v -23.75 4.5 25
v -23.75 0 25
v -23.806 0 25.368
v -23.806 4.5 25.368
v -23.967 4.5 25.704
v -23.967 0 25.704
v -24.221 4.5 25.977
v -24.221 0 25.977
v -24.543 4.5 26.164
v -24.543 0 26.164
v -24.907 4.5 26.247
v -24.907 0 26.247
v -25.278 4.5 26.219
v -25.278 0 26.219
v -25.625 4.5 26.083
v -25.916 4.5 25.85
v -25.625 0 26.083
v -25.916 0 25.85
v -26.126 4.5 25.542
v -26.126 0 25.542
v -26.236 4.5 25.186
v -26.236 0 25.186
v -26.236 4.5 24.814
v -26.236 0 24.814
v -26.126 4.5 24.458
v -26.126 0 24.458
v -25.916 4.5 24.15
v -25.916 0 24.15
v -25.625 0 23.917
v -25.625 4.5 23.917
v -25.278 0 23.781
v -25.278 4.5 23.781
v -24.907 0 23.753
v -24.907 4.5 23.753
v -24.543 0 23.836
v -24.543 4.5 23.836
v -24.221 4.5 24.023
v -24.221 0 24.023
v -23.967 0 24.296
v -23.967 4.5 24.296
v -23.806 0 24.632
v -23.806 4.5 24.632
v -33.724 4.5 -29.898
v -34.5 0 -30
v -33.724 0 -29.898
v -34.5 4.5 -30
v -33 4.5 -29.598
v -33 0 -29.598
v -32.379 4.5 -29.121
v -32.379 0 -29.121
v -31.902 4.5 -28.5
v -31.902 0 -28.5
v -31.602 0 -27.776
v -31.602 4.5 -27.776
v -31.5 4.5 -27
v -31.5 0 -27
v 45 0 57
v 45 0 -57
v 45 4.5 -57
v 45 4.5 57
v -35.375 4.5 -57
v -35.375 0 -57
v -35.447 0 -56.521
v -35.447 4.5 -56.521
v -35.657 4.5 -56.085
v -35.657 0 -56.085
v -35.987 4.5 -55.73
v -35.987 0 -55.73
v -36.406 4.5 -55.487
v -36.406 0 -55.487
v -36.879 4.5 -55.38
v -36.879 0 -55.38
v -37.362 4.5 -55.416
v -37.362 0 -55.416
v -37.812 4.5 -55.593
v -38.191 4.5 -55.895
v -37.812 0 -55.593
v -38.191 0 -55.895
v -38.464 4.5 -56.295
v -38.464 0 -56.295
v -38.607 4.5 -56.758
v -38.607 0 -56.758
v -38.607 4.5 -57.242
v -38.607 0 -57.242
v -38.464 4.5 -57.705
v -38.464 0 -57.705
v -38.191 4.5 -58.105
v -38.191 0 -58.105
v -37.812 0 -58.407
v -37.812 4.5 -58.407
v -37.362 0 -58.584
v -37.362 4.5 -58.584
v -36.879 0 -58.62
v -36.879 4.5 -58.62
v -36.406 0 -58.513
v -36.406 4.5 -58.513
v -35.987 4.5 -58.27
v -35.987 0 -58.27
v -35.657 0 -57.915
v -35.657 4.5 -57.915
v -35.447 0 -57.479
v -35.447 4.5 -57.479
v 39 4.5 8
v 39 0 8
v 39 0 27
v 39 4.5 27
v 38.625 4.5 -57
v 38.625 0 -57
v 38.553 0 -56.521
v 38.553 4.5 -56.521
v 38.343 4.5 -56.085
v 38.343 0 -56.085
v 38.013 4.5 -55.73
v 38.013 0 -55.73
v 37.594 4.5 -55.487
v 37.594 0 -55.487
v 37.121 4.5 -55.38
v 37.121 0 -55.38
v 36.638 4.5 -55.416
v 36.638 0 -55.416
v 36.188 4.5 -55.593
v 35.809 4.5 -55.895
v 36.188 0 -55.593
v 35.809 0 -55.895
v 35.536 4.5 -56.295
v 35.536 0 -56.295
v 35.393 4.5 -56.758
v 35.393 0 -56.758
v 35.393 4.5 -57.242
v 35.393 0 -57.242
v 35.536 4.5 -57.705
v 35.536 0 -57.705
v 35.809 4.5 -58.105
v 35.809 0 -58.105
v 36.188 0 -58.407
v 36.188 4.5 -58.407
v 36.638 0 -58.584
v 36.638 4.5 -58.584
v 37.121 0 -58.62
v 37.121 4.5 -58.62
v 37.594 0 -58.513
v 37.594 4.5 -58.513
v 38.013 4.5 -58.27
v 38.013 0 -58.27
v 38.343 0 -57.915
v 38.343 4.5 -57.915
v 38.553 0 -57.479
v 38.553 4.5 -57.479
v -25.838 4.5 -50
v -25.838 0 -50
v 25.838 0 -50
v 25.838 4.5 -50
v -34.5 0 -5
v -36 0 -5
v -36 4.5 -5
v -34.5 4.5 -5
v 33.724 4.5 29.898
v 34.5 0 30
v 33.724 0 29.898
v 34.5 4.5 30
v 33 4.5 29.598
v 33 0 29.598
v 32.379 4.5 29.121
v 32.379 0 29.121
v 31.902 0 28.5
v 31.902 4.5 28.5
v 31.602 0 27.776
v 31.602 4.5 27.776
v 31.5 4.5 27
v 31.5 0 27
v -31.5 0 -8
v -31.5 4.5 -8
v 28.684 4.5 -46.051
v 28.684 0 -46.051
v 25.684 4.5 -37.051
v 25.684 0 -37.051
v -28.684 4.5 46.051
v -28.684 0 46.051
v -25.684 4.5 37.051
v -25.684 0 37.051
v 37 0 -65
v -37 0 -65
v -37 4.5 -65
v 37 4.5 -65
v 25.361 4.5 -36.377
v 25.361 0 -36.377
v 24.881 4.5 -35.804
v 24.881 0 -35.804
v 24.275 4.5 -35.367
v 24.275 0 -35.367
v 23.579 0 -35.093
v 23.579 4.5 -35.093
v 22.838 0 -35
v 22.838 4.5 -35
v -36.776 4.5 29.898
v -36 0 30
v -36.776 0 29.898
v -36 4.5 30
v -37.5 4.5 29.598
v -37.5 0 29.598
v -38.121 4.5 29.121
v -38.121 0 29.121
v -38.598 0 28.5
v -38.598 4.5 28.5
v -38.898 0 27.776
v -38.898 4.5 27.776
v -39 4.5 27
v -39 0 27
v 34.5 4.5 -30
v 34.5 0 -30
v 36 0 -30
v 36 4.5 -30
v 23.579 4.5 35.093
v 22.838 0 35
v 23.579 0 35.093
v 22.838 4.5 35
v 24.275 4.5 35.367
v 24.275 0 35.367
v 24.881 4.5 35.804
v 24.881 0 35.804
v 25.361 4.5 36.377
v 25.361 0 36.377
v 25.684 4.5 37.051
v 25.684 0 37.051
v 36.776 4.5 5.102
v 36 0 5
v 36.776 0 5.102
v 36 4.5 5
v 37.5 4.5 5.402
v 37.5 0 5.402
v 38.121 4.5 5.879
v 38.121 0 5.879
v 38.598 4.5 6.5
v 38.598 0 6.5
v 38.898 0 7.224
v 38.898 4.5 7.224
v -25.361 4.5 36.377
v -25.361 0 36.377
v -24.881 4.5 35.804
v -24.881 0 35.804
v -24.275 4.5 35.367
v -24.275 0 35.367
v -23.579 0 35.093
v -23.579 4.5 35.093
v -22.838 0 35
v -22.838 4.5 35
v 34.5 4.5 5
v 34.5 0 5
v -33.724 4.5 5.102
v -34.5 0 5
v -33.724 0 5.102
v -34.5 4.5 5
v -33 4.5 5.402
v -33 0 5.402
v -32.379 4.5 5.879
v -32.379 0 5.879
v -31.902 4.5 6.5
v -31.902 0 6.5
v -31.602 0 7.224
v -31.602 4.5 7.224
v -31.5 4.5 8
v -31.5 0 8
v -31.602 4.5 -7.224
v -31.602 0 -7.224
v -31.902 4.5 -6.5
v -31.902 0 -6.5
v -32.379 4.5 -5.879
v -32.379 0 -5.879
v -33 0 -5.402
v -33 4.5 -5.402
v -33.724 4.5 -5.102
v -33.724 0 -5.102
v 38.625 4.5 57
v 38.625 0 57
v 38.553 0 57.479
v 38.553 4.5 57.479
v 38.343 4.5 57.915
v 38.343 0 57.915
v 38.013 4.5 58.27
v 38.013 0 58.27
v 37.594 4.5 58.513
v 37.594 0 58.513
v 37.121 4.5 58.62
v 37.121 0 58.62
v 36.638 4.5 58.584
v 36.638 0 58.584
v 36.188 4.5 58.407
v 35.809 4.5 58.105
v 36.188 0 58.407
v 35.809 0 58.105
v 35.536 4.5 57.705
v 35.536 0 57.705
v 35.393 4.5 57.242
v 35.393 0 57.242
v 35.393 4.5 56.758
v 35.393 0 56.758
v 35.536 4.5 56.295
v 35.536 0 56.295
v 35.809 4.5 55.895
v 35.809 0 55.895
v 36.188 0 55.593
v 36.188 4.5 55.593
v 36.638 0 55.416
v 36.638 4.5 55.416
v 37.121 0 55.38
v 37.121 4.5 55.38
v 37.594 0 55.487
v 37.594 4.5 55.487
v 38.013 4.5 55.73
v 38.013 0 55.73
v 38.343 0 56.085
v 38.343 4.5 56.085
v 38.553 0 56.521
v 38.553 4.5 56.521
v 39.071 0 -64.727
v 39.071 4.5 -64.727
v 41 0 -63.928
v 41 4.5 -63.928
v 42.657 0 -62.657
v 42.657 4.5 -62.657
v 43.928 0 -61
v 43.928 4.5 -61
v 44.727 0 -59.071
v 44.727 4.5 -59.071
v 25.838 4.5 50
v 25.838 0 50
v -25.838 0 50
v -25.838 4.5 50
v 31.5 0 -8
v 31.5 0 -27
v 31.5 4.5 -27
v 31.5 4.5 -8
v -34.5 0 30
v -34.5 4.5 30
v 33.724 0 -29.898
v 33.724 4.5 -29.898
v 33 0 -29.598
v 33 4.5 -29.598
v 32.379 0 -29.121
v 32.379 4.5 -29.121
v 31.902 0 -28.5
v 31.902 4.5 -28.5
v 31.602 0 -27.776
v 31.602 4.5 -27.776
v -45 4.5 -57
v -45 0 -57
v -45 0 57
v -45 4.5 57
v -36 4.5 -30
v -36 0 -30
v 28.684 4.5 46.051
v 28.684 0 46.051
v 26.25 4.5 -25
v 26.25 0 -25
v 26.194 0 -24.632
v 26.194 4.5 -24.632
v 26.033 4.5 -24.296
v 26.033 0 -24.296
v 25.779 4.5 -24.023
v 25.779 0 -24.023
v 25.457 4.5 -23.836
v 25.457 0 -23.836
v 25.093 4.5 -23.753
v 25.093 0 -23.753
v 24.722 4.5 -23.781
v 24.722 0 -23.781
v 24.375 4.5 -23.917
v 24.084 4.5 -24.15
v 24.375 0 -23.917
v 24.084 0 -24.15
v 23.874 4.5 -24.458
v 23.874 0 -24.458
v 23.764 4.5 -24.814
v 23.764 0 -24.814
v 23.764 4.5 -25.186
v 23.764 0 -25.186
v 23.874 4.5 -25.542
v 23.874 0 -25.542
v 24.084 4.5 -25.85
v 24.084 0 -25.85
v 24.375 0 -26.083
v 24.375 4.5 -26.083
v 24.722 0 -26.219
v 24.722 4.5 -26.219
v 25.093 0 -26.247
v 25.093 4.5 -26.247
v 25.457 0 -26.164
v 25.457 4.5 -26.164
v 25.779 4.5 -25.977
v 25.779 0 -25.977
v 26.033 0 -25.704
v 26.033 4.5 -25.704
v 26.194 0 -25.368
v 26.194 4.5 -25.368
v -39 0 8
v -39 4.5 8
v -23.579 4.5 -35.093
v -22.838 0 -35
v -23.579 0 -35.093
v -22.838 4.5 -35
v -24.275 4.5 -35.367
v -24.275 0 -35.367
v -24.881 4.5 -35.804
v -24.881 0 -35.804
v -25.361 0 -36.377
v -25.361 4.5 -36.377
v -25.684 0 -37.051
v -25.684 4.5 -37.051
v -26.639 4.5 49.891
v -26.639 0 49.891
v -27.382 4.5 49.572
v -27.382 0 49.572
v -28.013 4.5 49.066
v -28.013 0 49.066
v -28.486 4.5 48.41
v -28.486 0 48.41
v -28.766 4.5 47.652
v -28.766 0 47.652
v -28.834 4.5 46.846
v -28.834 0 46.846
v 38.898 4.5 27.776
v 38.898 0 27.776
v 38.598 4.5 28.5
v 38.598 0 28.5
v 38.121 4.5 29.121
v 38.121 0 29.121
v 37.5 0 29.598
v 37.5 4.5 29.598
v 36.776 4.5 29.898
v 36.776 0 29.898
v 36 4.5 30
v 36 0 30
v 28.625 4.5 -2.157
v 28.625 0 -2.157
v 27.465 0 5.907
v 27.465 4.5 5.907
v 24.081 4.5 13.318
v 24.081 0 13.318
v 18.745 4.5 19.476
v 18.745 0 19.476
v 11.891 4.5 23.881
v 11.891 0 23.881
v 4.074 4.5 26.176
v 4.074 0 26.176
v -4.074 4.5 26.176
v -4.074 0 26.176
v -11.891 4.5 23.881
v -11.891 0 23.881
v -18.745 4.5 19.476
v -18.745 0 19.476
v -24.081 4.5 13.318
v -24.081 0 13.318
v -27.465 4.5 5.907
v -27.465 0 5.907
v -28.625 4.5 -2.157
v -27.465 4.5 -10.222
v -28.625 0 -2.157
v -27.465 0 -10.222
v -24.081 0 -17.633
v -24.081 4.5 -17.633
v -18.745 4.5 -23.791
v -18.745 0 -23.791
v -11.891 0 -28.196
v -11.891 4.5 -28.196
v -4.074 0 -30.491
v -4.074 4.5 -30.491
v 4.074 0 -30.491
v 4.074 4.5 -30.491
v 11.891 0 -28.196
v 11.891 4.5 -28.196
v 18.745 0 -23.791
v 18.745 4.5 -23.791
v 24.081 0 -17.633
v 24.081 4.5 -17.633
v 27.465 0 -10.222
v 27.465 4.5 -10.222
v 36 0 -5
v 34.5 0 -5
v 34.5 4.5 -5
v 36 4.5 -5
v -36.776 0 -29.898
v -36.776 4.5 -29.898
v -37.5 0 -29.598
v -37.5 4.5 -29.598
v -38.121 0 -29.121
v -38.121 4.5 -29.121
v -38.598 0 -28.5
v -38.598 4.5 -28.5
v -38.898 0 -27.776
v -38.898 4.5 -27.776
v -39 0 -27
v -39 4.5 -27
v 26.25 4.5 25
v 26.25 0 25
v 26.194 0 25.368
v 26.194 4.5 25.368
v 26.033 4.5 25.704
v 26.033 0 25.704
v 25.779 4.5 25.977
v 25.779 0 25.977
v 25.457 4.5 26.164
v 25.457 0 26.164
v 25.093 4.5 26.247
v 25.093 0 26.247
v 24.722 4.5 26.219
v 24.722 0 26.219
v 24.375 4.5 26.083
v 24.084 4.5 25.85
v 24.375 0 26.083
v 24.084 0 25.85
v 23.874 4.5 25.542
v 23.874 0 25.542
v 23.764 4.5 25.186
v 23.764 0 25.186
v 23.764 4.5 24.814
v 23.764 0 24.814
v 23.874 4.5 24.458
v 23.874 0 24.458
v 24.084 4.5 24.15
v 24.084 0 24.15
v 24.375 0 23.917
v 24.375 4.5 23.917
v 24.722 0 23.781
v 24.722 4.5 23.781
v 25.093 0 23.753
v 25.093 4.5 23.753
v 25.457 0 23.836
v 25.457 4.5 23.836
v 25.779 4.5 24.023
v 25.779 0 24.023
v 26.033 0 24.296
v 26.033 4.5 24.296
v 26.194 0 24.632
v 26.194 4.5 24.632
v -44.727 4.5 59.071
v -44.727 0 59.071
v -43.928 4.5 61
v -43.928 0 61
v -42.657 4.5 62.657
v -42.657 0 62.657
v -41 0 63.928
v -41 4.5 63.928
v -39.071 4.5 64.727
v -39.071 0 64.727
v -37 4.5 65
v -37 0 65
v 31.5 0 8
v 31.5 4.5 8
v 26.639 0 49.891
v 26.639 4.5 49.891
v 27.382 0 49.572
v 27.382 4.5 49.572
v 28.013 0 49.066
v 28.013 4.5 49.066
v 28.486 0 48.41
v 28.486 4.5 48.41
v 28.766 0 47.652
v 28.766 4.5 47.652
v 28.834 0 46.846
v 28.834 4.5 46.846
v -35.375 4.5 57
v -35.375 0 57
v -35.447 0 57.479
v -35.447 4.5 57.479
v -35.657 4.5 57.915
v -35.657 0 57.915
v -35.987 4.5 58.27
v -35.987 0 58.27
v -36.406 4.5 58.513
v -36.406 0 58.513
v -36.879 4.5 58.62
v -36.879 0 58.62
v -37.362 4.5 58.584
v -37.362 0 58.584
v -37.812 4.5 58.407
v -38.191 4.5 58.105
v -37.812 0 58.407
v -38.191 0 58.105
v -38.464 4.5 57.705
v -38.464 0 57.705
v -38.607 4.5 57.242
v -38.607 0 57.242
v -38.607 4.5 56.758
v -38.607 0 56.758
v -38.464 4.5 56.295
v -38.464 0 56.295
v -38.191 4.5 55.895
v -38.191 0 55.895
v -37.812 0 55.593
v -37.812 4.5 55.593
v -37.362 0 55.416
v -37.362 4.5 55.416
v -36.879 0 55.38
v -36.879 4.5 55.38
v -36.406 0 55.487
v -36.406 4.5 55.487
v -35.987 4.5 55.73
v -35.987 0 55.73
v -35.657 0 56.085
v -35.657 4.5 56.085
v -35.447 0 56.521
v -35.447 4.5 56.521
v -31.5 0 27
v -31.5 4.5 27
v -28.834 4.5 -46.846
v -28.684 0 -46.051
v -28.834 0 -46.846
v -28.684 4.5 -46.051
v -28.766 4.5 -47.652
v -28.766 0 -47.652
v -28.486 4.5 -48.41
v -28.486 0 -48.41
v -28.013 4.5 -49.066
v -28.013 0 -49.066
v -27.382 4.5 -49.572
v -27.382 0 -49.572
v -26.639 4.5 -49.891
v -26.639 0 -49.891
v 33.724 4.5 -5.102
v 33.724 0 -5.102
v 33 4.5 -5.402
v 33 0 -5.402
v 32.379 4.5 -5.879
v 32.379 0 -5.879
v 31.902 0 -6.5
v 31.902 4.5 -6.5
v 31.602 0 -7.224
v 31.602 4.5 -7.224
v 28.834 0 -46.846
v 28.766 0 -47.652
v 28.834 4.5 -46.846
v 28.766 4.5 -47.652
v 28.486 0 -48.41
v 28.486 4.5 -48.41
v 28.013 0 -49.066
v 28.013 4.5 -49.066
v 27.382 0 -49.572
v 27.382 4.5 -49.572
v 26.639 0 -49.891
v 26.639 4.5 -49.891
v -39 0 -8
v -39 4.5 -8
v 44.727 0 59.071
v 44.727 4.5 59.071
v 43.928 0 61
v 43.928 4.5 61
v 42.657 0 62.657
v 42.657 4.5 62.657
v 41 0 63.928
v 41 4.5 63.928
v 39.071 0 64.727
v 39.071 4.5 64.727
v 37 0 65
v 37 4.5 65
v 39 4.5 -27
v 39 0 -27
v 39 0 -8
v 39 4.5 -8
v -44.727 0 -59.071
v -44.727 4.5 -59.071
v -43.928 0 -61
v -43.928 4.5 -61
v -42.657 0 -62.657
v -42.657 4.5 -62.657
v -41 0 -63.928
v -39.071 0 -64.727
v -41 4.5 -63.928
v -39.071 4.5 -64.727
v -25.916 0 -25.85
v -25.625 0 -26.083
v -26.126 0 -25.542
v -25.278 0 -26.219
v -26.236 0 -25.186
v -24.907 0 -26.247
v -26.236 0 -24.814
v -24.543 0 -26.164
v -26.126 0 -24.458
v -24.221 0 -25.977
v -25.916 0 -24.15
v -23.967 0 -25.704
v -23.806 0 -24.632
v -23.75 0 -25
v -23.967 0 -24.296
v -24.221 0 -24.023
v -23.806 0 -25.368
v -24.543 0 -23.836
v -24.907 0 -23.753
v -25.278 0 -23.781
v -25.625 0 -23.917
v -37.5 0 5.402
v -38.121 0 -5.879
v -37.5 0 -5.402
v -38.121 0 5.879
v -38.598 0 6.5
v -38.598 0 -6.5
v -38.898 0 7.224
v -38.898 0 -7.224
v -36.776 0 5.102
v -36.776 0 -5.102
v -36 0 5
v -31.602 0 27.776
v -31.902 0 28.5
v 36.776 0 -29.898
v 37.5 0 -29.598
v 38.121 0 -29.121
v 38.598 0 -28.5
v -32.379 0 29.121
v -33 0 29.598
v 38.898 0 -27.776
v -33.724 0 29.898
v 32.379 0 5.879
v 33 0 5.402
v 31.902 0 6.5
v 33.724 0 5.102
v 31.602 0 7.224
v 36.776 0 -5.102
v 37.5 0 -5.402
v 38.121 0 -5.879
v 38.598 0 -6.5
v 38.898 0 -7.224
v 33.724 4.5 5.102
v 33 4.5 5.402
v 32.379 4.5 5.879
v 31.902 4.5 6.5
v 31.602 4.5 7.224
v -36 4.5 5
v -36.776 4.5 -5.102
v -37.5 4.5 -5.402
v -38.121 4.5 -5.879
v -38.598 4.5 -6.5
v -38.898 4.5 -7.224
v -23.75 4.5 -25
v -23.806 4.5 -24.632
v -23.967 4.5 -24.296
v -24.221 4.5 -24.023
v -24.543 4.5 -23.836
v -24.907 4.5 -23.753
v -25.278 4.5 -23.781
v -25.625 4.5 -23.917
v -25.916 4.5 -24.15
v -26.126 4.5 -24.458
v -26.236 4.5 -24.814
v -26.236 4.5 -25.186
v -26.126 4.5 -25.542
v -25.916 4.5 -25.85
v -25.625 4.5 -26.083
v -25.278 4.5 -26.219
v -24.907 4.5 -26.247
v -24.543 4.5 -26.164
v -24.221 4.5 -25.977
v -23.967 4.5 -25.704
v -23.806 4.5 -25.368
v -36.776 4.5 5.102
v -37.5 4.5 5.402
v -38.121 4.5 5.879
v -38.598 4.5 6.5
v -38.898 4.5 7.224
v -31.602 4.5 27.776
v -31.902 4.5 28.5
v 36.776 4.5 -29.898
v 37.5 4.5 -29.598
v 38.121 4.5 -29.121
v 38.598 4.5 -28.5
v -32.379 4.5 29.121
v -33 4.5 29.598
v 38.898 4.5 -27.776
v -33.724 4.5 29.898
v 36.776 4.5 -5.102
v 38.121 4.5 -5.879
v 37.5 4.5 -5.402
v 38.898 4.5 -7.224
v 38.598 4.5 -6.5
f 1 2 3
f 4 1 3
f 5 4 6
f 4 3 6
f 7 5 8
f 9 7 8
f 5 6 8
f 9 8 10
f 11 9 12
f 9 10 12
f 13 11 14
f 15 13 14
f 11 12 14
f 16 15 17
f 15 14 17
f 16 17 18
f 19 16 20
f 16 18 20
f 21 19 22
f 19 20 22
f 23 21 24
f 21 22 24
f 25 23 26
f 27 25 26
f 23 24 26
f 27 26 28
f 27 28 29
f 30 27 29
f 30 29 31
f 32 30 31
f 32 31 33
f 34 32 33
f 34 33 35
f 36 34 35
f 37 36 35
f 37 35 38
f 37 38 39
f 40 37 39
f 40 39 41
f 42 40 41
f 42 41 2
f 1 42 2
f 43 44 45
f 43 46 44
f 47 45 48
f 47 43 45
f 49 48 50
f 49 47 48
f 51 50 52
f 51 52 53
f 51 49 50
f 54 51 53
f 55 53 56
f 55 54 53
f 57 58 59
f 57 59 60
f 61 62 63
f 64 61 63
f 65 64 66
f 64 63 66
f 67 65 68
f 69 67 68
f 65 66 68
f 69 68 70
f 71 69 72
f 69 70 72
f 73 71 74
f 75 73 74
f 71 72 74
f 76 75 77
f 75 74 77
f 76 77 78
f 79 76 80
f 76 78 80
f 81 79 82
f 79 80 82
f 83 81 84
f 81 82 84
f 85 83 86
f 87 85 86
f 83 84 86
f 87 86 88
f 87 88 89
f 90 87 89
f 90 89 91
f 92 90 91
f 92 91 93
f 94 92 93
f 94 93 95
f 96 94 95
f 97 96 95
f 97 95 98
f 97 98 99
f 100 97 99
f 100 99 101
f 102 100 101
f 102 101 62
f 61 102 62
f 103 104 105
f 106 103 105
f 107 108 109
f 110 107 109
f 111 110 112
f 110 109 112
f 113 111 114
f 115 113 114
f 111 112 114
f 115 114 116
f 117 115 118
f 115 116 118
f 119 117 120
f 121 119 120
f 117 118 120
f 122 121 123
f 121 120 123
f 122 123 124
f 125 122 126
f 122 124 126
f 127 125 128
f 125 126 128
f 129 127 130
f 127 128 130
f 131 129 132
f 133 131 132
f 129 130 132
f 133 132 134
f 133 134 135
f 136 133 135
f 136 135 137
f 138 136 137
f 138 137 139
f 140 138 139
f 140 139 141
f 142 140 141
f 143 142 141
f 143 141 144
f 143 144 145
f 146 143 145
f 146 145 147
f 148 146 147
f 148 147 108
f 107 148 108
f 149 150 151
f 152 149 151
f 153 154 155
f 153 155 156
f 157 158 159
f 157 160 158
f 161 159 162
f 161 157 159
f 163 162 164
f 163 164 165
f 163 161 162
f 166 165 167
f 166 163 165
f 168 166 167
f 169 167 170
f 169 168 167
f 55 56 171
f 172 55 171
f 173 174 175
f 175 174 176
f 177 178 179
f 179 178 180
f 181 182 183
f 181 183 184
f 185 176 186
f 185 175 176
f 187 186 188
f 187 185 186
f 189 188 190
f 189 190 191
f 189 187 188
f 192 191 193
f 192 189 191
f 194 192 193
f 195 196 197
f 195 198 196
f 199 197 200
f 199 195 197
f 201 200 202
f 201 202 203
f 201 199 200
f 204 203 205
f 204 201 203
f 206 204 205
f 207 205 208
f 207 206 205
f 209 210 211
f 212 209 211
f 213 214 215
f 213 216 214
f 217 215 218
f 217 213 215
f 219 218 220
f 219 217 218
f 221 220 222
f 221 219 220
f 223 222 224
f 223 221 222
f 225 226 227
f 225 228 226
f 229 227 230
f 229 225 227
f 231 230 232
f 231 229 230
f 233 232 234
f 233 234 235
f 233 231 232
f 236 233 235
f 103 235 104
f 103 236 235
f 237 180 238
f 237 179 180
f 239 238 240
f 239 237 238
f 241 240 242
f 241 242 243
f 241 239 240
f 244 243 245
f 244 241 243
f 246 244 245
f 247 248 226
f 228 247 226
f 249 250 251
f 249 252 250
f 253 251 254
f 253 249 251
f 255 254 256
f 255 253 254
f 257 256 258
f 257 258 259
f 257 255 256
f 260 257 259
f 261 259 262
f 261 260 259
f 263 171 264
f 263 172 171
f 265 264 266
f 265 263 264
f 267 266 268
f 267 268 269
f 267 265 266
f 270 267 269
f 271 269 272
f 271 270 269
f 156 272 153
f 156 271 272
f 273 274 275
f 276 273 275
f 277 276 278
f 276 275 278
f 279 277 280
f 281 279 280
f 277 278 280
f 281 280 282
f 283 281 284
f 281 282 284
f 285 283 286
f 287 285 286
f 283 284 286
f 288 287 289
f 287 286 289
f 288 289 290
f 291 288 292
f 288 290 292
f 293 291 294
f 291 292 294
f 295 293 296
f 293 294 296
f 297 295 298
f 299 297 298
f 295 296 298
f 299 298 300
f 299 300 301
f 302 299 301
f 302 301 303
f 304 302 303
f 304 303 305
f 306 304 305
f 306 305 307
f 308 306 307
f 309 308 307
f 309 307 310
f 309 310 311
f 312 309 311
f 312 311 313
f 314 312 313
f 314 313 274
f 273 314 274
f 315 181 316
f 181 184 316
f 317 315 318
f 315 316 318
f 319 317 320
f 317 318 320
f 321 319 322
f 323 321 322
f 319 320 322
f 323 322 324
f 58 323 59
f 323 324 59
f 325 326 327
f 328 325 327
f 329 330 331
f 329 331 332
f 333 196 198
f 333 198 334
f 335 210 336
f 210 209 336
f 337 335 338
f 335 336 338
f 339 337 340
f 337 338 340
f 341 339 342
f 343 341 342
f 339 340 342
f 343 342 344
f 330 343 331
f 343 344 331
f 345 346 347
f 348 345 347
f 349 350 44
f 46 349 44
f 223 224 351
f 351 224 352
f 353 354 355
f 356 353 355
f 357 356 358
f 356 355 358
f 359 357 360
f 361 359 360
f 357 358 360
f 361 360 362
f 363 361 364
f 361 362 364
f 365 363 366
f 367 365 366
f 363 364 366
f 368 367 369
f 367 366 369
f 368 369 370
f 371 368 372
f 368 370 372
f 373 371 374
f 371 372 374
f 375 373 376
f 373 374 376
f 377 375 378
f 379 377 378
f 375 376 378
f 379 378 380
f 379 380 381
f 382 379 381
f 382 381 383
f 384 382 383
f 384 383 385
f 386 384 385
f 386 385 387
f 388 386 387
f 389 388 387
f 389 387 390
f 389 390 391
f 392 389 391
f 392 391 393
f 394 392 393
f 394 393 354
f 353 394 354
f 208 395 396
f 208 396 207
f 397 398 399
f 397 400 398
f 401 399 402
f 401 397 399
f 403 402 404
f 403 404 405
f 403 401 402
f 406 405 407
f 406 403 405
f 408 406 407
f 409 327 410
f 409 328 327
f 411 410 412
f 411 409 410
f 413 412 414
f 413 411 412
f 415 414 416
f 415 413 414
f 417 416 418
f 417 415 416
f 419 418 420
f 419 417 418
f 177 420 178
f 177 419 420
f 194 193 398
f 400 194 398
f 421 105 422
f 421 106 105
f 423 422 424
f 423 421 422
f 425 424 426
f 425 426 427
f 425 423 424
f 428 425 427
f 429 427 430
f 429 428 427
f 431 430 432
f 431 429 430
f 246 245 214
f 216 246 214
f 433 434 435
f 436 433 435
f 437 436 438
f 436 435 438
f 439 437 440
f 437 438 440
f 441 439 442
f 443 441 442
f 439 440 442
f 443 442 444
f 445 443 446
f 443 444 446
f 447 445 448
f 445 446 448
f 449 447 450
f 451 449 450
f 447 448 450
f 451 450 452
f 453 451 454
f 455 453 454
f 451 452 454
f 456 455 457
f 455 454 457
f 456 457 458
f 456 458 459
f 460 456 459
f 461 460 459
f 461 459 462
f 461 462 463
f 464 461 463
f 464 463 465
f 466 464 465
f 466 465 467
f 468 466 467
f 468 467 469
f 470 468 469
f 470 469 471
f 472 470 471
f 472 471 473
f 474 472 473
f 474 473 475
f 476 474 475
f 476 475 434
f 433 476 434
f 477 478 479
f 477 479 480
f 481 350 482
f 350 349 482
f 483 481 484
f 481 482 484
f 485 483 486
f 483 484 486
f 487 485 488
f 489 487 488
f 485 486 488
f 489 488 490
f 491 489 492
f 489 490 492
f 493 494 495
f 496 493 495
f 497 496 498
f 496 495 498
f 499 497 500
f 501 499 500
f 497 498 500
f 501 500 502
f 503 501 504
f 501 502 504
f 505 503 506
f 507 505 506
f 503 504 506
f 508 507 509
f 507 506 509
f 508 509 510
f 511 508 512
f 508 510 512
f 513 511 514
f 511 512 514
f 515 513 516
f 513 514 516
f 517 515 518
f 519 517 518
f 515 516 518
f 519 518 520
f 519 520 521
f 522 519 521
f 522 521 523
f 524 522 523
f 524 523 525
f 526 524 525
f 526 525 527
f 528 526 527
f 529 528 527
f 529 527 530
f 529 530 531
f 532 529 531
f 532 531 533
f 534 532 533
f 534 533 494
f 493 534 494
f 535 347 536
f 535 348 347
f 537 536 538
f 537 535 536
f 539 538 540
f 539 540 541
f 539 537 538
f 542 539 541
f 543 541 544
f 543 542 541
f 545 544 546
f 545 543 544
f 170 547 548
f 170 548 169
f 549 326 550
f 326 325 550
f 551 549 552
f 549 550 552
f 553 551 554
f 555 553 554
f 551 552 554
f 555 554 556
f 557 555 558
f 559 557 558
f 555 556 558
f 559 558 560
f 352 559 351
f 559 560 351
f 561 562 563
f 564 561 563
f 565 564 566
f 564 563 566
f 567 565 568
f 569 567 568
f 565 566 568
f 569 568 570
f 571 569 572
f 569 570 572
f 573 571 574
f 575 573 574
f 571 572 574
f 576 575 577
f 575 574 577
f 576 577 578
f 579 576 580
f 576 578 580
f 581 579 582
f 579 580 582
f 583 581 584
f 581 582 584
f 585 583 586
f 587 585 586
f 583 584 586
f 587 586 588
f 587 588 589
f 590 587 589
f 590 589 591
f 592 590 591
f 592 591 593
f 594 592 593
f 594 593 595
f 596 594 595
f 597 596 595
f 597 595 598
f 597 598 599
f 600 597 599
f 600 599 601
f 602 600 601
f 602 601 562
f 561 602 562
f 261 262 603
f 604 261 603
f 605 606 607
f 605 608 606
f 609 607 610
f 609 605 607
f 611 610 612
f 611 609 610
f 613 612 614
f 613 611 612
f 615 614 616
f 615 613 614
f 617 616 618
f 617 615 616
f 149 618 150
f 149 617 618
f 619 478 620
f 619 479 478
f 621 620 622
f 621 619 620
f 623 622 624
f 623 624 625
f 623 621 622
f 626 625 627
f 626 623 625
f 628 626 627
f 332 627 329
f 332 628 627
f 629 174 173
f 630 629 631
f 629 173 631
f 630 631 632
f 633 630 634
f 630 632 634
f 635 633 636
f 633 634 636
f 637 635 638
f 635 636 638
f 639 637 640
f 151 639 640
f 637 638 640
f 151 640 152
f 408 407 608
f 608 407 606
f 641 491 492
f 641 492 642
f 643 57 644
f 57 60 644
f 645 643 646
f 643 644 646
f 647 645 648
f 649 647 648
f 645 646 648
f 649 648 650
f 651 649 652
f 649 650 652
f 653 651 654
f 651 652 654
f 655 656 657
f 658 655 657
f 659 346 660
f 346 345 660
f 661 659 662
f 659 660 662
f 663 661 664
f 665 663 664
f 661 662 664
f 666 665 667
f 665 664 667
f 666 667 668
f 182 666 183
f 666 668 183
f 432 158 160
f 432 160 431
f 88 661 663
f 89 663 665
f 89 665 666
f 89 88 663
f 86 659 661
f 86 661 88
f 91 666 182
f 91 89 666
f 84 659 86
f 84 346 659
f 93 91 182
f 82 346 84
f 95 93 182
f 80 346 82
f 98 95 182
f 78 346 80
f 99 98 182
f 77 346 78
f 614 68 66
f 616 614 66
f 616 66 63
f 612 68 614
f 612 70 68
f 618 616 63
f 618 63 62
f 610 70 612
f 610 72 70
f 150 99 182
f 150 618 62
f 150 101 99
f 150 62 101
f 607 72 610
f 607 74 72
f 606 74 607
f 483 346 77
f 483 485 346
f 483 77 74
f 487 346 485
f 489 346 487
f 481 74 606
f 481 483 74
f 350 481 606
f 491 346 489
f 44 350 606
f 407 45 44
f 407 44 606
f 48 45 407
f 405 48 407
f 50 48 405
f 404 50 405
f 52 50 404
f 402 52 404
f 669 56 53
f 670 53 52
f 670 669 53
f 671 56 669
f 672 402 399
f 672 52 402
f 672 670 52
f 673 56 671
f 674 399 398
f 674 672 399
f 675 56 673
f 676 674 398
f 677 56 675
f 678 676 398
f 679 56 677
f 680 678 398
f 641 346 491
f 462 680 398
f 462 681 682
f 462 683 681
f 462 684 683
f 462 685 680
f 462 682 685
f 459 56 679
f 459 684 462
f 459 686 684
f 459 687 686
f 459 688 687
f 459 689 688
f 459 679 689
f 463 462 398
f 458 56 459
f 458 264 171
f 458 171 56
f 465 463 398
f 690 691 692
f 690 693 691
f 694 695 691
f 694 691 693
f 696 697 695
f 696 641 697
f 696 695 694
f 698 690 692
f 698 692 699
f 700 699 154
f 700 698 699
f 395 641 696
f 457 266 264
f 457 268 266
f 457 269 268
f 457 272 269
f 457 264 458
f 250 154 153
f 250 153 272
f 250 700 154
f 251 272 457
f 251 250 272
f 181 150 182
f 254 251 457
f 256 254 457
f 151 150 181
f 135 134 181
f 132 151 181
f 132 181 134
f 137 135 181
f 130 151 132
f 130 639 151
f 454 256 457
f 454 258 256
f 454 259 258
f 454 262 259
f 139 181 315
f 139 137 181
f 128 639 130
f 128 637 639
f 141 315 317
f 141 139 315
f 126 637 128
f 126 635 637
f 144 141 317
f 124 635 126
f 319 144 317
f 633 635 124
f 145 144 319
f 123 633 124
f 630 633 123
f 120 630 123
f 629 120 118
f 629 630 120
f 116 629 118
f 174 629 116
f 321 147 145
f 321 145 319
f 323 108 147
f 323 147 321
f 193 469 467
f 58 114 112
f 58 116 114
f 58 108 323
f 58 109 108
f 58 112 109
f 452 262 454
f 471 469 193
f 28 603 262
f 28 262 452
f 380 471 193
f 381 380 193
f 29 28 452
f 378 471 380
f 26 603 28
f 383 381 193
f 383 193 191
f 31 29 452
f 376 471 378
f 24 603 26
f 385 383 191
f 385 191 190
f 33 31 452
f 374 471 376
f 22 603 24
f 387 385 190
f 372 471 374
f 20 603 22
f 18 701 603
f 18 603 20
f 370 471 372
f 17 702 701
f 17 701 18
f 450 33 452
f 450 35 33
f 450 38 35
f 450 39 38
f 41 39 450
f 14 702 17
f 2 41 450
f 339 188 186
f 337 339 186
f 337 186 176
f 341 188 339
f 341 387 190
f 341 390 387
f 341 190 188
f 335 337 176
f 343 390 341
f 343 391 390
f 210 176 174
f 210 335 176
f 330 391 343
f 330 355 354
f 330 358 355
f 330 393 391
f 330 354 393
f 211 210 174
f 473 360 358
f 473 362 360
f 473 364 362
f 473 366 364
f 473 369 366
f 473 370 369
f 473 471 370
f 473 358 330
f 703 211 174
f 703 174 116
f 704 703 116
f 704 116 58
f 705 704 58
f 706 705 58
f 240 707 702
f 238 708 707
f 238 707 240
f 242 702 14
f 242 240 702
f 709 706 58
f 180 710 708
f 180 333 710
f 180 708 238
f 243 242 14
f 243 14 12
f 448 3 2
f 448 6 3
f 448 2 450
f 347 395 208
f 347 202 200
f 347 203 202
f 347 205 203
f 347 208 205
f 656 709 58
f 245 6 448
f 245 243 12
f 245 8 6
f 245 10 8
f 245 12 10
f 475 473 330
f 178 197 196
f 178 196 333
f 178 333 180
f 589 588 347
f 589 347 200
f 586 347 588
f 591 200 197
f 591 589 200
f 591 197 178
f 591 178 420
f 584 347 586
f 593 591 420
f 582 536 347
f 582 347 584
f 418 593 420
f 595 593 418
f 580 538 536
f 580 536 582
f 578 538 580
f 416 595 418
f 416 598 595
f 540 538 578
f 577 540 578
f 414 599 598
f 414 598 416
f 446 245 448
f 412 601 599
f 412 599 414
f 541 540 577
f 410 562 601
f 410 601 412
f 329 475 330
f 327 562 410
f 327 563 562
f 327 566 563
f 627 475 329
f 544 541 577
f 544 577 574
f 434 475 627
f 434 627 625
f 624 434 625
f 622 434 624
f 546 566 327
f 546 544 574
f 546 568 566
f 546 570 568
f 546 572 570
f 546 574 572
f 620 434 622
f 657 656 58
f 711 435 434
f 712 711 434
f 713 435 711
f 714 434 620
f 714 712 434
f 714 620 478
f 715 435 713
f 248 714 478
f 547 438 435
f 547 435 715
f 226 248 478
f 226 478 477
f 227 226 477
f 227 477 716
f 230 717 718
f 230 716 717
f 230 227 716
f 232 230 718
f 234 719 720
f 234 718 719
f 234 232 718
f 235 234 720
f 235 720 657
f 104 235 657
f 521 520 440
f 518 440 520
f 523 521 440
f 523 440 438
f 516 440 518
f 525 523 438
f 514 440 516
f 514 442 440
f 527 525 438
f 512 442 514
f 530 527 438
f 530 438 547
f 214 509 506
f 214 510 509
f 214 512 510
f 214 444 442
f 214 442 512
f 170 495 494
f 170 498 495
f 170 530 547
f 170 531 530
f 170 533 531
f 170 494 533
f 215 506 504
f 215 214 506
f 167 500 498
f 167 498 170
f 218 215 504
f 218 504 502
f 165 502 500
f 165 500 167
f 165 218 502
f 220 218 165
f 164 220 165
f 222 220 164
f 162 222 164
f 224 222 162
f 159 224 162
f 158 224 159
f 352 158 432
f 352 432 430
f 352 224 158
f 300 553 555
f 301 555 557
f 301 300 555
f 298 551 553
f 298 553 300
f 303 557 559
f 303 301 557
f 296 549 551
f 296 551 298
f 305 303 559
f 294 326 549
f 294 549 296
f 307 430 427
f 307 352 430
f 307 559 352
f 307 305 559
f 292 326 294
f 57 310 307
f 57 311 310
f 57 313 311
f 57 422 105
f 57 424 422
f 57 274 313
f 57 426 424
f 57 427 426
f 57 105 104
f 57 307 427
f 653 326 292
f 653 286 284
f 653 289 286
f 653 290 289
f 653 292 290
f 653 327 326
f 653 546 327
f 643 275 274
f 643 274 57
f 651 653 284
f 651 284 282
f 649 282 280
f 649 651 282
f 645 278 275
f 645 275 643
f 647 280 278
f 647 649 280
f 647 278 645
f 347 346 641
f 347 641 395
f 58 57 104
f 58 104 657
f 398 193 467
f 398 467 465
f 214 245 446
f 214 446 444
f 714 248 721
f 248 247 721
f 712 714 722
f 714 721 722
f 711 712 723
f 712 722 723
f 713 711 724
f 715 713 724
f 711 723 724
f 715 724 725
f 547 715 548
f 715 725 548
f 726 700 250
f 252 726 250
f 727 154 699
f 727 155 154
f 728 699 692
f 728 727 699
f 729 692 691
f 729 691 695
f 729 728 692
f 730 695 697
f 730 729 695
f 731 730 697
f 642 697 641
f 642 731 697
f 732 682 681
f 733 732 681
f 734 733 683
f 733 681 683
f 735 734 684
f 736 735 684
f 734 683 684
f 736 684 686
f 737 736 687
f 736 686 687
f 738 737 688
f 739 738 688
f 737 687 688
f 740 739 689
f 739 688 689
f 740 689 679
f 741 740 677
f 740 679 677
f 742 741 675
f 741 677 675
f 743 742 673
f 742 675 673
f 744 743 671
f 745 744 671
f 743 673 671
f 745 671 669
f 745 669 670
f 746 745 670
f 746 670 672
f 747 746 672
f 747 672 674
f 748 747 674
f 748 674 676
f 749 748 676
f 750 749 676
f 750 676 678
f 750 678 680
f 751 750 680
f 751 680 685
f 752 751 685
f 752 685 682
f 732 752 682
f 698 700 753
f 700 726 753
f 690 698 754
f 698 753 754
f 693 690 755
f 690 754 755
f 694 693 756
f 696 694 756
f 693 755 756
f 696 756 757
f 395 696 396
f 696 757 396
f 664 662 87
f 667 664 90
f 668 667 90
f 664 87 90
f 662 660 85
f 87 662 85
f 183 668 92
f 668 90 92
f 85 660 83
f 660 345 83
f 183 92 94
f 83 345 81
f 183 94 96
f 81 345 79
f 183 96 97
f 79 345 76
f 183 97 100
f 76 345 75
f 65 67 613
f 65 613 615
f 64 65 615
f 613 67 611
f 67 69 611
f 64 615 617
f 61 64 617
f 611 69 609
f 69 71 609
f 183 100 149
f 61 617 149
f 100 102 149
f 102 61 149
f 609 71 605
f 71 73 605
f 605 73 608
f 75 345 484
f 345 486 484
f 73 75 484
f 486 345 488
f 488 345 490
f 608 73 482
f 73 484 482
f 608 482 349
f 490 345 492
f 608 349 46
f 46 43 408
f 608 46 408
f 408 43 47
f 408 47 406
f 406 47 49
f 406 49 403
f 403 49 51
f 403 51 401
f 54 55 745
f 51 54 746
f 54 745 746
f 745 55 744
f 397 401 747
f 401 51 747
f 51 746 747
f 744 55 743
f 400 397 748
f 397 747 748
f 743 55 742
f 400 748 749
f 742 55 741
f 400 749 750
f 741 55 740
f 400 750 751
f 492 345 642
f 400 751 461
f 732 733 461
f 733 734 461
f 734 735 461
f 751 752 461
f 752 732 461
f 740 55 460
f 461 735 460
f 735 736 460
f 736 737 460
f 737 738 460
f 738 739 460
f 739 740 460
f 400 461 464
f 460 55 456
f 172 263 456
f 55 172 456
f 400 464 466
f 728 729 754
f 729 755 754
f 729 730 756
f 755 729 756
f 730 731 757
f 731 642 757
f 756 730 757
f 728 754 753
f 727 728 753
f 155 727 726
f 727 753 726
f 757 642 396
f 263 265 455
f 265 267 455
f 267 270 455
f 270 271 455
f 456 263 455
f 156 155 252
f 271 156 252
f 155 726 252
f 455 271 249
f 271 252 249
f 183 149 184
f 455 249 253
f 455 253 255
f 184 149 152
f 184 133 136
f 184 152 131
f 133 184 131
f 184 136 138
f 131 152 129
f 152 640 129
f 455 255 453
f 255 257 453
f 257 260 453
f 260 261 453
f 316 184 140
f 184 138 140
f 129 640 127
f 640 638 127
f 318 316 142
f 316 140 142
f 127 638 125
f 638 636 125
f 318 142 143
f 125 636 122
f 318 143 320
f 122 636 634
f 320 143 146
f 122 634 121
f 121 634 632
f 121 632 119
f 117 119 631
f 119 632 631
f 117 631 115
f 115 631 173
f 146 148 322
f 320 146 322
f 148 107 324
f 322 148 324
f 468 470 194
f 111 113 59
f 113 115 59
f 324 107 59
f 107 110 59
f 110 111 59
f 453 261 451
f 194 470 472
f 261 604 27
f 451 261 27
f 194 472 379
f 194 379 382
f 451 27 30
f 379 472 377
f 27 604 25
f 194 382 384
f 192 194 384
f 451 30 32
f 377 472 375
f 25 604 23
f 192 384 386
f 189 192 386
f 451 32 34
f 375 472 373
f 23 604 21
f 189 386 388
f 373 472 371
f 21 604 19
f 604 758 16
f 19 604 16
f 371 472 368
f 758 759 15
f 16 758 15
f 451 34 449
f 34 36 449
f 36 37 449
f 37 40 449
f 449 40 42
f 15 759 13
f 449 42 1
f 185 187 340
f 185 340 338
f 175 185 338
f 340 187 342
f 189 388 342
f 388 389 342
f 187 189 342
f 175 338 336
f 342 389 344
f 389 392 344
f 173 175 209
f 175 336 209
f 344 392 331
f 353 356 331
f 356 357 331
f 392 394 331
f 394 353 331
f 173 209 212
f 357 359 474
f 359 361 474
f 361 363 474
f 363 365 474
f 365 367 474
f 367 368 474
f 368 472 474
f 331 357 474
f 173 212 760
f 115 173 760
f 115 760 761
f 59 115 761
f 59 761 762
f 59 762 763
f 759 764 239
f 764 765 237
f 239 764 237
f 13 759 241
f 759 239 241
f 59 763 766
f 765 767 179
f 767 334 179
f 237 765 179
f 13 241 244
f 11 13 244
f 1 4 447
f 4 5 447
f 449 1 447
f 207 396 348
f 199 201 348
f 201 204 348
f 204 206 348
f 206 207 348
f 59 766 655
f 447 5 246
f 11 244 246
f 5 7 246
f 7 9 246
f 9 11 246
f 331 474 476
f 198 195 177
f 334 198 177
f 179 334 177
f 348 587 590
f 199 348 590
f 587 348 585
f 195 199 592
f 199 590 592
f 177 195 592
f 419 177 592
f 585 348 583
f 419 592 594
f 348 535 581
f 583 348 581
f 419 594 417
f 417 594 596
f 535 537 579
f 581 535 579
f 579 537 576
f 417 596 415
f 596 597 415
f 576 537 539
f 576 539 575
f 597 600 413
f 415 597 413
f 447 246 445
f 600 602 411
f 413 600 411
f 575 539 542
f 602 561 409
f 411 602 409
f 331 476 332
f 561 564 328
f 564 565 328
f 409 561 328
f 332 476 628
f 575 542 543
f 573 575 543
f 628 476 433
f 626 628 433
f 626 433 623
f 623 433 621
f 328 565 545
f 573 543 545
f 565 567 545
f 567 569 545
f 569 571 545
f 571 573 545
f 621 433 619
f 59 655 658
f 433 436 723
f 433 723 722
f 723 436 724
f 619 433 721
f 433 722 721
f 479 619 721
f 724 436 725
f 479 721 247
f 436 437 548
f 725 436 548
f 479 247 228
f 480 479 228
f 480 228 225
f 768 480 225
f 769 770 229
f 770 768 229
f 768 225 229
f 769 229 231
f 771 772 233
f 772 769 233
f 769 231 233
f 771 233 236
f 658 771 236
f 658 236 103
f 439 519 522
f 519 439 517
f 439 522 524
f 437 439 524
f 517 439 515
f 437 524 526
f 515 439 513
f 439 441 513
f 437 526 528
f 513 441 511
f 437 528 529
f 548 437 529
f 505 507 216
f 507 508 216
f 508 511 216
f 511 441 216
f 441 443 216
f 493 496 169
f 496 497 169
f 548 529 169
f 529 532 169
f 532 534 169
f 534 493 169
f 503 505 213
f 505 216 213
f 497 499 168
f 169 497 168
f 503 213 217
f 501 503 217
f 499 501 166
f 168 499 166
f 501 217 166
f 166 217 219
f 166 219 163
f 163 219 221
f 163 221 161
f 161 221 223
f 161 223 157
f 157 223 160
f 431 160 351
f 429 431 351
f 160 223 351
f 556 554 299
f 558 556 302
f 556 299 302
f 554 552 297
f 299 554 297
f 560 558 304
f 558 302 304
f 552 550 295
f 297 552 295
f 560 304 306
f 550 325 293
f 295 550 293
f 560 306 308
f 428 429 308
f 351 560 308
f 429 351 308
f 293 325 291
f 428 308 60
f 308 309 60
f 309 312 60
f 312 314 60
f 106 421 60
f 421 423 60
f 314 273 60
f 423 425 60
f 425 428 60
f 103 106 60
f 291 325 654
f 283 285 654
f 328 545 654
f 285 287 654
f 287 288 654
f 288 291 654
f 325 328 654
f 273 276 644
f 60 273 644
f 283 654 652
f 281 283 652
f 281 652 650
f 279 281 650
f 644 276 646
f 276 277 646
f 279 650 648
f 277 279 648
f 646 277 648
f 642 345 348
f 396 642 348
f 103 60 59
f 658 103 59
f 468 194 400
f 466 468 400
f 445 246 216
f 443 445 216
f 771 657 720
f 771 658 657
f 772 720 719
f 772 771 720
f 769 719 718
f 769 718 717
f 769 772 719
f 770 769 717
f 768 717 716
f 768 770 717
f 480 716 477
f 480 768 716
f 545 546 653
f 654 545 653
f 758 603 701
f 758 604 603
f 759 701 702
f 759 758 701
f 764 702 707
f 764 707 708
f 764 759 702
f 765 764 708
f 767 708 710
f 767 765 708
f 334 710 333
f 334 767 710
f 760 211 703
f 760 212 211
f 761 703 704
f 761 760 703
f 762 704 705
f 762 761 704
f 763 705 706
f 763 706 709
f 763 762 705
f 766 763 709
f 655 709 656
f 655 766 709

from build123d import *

# Parameters (mm, degrees)
F0_W      = 90
F0_H      = 130
F1_DEPTH  = 4.5
F2_R      = 8
F3_R      = 28.625
F4_DEPTH  = 4.501
F5_R      = 1.625
F6_DEPTH  = 4.501
F7_R      = 1.25
F8_DEPTH  = 4.501
F9_W      = 7.5
F9_H      = 25
F10_DEPTH = 4.501
F11_R     = 3


with BuildPart() as f1:
    # F0 (on Front) → F1 (new body)
    with BuildSketch(Plane.XZ):
        Rectangle(F0_W, F0_H)
    extrude(amount=-F1_DEPTH)

    # F2
    f2_edges = [f1.edges().sort_by_distance(p)[0] for p in [
        (45, 2.25, 65),
        (45, 2.25, -65),
        (-45, 2.25, -65),
        (-45, 2.25, 65),
    ]]
    fillet(f2_edges, radius=F2_R)

    # F3 (on Front) → F4 (cut, through all)
    with BuildSketch(Plane.XZ):
        with Locations((0, -2.157351)):
            Circle(F3_R)
    extrude(amount=-F4_DEPTH, mode=Mode.SUBTRACT)

    # F5 (on Front) → F6 (cut, through all)
    with BuildSketch(Plane.XZ):
        with Locations((-37, 57)):
            Circle(F5_R)
        with Locations((37, 57)):
            Circle(F5_R)
        with Locations((-37, -57)):
            Circle(F5_R)
        with Locations((37, -57)):
            Circle(F5_R)
    extrude(amount=-F6_DEPTH, mode=Mode.SUBTRACT)

    # F7 (on Front) → F8 (cut, through all)
    with BuildSketch(Plane.XZ):
        with Locations((-25, 25)):
            Circle(F7_R)
        with Locations((25, 25)):
            Circle(F7_R)
        with Locations((-25, -25)):
            Circle(F7_R)
        with Locations((25, -25)):
            Circle(F7_R)
    extrude(amount=-F8_DEPTH, mode=Mode.SUBTRACT)

    # F9 (on Front) → F10 (cut, through all)
    with BuildSketch(Plane.XZ):
        Polygon((30, 50), (-30, 50), (-25, 35), (25, 35), align=None)
        with Locations((35.25, 17.5)):
            Rectangle(F9_W, F9_H)
        with Locations((35.25, -17.5)):
            Rectangle(F9_W, F9_H)
        Polygon((30, -50), (25, -35), (-25, -35), (-30, -50), align=None)
        with Locations((-35.25, -17.5)):
            Rectangle(F9_W, F9_H)
        with Locations((-35.25, 17.5)):
            Rectangle(F9_W, F9_H)
    extrude(amount=-F10_DEPTH, mode=Mode.SUBTRACT)

    # F11
    f11_edges = [f1.edges().sort_by_distance(p)[0] for p in [
        (-39, 2.25, 5),
        (-39, 2.25, -30),
        (-30, 2.25, -50),
        (-25, 2.25, 35),
        (31.5, 2.25, 5),
        (31.5, 2.25, -30),
        (39, 2.25, -30),
        (39, 2.25, 5),
        (25, 2.25, 35),
        (30, 2.25, -50),
        (39, 2.25, 30),
        (39, 2.25, -5),
        (25, 2.25, -35),
        (31.5, 2.25, -5),
        (31.5, 2.25, 30),
        (-30, 2.25, 50),
        (30, 2.25, 50),
        (-25, 2.25, -35),
        (-39, 2.25, -5),
        (-39, 2.25, 30),
        (-31.5, 2.25, 30),
        (-31.5, 2.25, -5),
        (-31.5, 2.25, -30),
        (-31.5, 2.25, 5),
    ]]
    fillet(f11_edges, radius=F11_R)


solid = f1.part
